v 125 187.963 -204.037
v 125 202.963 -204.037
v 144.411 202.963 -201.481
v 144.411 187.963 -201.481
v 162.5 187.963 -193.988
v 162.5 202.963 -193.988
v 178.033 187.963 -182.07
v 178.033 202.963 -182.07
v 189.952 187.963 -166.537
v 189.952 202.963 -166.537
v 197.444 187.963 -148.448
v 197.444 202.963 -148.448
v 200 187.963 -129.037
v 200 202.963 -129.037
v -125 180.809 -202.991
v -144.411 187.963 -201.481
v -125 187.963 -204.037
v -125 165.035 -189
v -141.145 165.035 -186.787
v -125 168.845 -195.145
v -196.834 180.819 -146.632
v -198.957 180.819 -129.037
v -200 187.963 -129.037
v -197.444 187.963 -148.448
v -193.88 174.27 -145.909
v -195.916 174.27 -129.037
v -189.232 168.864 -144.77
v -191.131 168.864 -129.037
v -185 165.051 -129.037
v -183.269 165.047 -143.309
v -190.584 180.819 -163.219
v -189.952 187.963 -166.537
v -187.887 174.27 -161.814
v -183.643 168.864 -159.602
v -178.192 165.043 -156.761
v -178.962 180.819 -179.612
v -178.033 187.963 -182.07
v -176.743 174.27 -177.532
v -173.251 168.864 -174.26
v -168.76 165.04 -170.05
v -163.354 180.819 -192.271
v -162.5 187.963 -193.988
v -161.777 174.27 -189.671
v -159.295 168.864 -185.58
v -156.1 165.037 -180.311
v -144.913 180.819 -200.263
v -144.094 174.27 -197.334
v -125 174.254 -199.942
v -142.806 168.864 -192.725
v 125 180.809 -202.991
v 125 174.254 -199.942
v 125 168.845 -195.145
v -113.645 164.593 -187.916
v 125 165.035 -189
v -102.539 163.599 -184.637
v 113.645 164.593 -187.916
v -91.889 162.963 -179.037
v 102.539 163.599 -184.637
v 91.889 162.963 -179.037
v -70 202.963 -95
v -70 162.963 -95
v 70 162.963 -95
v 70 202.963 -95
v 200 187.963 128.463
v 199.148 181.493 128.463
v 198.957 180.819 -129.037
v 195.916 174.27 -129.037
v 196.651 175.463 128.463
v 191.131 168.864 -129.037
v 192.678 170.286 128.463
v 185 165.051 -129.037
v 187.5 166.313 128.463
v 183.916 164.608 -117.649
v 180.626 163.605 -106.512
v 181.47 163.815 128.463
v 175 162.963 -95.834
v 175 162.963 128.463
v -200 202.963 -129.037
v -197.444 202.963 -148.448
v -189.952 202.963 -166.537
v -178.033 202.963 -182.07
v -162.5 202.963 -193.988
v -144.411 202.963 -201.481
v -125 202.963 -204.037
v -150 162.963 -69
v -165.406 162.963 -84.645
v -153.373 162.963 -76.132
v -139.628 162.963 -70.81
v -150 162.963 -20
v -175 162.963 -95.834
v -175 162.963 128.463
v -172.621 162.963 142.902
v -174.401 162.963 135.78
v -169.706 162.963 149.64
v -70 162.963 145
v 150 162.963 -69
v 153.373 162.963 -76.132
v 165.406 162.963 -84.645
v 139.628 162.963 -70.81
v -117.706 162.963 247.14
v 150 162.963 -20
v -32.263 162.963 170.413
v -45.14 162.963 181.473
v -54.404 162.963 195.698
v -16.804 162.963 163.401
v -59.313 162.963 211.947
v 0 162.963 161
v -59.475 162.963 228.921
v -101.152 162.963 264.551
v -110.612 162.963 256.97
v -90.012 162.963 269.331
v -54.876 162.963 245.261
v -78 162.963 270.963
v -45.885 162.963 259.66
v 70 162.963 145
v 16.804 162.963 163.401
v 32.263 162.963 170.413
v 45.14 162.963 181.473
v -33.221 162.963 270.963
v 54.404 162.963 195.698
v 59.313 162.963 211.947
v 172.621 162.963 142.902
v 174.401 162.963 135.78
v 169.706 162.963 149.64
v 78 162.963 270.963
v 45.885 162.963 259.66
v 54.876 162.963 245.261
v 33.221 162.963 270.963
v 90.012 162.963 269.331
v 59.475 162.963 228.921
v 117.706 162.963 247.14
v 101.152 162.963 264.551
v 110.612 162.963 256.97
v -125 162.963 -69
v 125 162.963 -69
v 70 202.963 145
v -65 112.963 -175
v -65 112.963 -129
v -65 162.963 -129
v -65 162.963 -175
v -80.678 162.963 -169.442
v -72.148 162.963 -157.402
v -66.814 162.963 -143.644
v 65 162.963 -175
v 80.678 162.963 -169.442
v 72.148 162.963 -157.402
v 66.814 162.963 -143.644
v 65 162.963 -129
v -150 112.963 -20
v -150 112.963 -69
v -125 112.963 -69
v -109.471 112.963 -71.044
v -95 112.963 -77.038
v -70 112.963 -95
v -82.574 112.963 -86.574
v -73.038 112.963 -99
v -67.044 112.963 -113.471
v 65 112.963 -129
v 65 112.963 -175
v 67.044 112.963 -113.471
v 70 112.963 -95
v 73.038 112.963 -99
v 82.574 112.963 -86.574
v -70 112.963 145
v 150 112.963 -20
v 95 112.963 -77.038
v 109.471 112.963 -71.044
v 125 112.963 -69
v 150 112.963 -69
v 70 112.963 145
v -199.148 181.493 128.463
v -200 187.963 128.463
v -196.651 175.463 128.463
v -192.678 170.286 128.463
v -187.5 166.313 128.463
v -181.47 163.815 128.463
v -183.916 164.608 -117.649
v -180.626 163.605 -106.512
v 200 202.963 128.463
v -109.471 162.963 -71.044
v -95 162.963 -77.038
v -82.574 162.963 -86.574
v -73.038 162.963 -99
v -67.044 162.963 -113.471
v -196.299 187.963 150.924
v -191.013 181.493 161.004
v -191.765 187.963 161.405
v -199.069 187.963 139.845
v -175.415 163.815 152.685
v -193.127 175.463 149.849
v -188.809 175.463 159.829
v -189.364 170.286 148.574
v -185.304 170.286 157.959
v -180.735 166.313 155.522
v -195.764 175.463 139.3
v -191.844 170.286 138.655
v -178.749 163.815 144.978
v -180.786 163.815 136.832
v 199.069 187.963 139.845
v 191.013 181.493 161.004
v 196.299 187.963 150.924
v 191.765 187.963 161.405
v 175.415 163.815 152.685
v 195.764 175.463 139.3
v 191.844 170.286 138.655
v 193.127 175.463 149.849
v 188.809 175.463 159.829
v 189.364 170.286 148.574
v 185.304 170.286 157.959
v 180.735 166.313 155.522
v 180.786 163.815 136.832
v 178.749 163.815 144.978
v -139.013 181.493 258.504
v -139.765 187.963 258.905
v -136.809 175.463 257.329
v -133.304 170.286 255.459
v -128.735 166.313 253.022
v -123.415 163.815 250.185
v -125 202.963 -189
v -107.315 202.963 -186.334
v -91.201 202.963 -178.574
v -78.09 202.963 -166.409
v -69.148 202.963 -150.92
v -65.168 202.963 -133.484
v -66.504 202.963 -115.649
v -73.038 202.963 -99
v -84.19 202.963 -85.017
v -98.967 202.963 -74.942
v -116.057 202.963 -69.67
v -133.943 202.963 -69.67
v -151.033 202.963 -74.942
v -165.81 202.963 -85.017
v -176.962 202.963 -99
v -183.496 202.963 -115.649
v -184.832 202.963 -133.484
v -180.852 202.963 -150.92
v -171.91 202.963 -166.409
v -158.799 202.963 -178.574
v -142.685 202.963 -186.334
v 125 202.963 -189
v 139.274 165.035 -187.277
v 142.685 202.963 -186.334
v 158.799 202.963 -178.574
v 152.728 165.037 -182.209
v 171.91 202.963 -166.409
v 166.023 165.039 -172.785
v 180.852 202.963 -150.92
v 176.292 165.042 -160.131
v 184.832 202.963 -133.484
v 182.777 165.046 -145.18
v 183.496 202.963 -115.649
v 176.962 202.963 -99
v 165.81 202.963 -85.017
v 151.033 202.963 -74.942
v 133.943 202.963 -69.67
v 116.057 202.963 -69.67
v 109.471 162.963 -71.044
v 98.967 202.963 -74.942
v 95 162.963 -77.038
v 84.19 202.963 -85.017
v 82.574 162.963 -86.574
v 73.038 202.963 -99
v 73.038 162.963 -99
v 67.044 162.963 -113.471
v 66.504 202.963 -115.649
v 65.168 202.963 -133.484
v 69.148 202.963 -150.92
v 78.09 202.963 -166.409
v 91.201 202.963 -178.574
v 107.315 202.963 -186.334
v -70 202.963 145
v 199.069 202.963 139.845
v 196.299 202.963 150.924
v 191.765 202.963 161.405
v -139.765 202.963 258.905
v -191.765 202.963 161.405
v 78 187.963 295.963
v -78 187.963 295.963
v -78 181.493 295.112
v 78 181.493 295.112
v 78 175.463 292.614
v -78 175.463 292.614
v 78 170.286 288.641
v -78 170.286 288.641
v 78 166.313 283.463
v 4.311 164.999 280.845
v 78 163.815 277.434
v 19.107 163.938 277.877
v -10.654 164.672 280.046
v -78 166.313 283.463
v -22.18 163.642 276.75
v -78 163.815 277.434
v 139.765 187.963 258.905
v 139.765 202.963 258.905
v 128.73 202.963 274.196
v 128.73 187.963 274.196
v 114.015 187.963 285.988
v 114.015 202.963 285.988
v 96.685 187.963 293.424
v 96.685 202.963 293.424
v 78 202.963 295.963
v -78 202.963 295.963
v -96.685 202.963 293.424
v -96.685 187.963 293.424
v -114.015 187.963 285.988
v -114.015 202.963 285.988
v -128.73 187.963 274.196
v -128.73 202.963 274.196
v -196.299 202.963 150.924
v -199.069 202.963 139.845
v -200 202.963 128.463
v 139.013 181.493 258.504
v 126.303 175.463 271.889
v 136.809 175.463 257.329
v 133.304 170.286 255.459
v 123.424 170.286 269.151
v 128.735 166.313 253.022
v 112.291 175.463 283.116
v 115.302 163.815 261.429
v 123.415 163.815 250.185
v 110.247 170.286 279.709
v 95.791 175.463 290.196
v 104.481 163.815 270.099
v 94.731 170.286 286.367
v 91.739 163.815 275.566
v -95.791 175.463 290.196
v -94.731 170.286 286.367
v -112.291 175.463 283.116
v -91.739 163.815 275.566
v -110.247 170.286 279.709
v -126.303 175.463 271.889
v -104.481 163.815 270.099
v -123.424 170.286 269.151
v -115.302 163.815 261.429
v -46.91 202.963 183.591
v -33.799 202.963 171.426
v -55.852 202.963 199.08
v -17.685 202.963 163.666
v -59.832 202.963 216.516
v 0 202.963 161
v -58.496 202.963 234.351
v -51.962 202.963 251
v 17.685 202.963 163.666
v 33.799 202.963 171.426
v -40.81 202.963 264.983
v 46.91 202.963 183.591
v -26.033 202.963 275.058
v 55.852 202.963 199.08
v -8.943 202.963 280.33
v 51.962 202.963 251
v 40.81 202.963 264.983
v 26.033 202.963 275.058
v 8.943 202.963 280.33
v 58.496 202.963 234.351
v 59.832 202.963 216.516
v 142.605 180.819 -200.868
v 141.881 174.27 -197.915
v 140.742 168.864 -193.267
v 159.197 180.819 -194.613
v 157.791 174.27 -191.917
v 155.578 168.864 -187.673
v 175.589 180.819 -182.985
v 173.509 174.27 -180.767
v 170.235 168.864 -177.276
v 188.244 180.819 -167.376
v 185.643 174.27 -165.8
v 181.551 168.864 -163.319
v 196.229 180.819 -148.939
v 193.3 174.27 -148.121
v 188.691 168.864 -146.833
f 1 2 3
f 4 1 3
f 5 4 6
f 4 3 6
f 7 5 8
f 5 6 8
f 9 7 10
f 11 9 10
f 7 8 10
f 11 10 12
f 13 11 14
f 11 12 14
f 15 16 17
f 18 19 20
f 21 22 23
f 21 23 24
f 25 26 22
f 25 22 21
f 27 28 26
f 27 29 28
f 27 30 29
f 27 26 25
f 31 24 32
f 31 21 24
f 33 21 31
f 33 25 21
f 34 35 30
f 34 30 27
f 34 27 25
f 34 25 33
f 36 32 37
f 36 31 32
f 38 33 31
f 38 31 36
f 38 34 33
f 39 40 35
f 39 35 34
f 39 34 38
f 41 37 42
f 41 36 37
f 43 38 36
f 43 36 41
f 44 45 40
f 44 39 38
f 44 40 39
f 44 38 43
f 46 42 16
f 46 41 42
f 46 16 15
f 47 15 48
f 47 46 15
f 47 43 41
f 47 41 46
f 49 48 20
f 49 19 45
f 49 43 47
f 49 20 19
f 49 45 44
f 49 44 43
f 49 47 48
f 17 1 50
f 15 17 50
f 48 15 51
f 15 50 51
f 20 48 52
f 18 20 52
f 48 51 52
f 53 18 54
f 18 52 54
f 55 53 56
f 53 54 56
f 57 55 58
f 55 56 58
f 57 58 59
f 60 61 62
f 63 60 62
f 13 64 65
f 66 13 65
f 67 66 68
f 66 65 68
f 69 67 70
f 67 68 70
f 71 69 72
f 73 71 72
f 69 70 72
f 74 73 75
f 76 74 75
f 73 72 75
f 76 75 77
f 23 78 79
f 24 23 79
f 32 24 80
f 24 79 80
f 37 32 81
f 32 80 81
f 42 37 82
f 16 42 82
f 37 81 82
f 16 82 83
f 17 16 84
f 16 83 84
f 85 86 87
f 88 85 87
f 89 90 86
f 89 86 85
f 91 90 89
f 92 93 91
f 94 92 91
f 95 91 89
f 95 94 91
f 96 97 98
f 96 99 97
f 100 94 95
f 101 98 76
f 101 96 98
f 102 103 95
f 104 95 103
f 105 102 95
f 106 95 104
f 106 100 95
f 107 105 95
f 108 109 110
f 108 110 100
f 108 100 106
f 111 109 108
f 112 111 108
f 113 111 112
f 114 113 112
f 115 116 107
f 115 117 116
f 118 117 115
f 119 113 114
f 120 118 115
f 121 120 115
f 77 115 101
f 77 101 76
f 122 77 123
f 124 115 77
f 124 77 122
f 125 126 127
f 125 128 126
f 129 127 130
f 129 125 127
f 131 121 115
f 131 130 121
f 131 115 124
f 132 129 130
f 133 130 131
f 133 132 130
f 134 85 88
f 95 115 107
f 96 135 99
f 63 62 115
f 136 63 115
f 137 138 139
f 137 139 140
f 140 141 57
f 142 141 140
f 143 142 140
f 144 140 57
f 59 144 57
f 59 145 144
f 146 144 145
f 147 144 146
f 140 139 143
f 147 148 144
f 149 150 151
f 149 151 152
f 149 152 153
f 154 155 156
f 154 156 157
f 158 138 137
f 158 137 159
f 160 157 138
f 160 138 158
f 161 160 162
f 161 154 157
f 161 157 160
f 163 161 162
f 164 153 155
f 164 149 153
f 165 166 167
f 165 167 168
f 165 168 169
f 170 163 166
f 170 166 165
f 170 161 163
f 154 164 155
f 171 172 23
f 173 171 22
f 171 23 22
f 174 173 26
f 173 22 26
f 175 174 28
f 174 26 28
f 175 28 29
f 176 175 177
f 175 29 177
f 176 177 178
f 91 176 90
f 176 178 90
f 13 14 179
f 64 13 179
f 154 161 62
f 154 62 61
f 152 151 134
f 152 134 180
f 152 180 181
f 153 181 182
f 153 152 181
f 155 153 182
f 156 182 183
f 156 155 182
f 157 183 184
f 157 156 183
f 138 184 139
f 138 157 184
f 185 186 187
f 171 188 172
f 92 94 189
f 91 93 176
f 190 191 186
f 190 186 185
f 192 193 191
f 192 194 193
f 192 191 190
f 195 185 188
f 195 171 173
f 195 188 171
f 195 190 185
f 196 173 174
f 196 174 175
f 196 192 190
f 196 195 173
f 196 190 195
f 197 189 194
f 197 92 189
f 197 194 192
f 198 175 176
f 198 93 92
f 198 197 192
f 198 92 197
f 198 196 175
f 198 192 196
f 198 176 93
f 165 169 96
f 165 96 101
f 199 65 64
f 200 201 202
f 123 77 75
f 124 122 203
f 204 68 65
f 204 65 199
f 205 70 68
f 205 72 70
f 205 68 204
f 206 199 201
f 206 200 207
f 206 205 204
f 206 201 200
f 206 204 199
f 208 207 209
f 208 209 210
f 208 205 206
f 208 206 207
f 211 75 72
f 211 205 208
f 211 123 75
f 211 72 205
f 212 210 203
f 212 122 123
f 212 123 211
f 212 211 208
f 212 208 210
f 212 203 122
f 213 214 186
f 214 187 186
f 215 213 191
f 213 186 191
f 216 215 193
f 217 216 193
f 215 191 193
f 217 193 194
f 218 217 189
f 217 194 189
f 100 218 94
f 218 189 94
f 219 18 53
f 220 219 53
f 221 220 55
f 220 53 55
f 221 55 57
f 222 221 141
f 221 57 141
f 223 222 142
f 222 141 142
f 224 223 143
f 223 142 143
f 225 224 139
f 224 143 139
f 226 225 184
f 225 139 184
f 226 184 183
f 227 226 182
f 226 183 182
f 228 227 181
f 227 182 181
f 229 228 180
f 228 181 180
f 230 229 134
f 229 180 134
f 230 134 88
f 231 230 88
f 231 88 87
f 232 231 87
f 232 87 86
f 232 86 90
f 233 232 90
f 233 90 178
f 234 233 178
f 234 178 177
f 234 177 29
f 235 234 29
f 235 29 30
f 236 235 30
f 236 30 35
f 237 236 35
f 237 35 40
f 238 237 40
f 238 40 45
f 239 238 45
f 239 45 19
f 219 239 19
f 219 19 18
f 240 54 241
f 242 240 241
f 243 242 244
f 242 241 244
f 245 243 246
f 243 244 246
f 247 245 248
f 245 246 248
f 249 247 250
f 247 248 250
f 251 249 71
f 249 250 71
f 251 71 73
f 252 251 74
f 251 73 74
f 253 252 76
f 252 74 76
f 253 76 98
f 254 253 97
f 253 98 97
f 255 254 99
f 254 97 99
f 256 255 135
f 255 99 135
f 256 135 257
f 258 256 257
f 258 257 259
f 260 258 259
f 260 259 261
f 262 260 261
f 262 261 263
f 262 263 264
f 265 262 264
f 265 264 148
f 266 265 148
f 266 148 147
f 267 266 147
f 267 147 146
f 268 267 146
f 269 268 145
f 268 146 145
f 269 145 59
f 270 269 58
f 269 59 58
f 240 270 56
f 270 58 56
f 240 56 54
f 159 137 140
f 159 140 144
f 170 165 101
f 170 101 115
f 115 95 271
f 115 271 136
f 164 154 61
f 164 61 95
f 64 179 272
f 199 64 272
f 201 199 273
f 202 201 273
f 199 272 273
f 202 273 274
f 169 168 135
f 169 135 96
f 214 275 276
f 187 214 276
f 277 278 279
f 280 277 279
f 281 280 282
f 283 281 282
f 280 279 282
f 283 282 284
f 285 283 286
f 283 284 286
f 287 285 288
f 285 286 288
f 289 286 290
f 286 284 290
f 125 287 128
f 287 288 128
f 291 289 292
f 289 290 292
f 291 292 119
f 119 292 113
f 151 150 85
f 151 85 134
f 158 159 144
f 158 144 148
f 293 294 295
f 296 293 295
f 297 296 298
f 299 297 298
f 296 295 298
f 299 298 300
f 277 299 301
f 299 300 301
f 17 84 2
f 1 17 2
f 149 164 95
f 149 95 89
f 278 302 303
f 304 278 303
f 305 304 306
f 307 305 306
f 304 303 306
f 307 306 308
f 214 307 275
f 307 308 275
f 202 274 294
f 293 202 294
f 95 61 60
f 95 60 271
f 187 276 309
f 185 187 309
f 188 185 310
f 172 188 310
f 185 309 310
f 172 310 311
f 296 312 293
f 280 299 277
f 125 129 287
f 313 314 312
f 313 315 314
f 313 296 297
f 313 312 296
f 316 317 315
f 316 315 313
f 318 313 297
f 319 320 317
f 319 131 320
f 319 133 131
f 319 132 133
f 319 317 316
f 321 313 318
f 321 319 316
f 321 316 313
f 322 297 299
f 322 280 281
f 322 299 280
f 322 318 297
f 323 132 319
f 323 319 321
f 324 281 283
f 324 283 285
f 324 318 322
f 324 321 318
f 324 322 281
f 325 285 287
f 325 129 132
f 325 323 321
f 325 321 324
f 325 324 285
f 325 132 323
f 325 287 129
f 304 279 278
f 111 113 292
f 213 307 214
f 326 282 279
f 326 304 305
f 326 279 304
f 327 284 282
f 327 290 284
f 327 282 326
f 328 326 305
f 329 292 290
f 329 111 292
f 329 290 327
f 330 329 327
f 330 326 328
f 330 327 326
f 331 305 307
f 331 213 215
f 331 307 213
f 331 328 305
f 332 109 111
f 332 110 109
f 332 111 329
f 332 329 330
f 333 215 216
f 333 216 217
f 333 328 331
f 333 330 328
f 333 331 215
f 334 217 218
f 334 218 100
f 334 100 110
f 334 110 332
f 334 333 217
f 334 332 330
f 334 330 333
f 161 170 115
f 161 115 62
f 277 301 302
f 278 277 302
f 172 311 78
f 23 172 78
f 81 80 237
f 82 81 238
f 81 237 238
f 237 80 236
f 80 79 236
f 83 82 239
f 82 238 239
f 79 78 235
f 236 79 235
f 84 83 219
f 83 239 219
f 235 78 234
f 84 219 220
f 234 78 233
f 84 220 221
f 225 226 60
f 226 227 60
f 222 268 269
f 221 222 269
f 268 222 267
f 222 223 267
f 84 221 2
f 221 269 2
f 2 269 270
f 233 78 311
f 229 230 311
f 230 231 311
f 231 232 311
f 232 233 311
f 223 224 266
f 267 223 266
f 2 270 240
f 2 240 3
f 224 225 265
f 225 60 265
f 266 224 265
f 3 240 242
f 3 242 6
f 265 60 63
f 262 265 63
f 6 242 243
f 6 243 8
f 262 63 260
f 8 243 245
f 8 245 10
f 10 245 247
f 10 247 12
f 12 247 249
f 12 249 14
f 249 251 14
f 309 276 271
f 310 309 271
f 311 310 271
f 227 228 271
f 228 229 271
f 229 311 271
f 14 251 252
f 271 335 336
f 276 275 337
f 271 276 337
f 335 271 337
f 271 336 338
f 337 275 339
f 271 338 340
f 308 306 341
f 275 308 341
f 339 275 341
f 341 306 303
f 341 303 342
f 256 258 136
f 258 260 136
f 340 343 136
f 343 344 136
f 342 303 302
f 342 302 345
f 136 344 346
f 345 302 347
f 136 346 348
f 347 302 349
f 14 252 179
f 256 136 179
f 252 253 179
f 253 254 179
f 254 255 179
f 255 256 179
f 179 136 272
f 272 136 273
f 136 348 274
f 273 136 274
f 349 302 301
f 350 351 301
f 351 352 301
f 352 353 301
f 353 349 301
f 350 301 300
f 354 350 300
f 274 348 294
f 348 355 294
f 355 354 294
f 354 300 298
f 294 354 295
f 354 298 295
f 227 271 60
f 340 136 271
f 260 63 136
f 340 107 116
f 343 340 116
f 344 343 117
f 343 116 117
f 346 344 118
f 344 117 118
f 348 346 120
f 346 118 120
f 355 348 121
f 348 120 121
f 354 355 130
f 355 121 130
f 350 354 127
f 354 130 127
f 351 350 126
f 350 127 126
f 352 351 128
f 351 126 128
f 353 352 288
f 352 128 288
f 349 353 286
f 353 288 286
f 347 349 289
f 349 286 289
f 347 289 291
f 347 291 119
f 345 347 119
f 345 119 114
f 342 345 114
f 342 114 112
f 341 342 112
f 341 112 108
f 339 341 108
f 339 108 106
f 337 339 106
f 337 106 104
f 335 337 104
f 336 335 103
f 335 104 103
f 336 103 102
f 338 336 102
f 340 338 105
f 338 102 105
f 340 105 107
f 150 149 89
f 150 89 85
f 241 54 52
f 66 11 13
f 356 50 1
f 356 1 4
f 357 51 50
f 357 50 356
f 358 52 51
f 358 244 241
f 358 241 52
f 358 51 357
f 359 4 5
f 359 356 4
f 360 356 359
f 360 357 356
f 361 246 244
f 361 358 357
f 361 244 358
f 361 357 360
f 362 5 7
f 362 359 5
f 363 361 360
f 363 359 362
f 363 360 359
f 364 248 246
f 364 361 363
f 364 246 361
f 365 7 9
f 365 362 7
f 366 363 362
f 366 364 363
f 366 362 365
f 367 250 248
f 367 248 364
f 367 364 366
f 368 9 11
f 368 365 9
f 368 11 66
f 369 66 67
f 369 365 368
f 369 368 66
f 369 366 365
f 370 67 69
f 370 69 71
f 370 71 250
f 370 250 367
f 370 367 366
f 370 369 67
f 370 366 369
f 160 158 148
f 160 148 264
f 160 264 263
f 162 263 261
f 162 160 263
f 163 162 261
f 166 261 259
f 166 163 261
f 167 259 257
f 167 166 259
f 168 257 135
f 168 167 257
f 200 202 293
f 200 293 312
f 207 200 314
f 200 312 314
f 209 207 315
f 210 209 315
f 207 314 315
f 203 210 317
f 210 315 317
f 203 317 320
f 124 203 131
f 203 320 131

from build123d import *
from build123d.topology import SkipClean

# Parameters (mm, degrees)
BOSS_EXTRUDE1_DEPTH = 40
FILLET1_R           = 25
SKETCH3_R           = 60
SKETCH3_W           = 140
SKETCH3_H           = 240
CUT_EXTRUDE1_DEPTH  = 360.436212163
BOSS_EXTRUDE2_START = 50
BOSS_EXTRUDE2_DEPTH = 50


with BuildPart() as part:
    # Sketch2 → Boss-Extrude1 (new body)
    with BuildSketch(Plane.XZ.offset(-202.963495408)):
        with BuildLine():
            Line((-139.764705882, 258.904671879), (-191.764705882, 161.404671879))
            ThreePointArc((-191.764705882, 161.404671879), (-197.90997501, 145.440989161), (-200, 128.463495408))
            Line((-200, 128.463495408), (-200, -129.036504592))
            ThreePointArc((-200, -129.036504592), (-178.033008589, -182.06951318), (-125, -204.036504592))
            Line((-125, -204.036504592), (125, -204.036504592))
            ThreePointArc((125, -204.036504592), (178.033008589, -182.06951318), (200, -129.036504592))
            Line((200, -129.036504592), (200, 128.463495408))
            ThreePointArc((200, 128.463495408), (197.90997501, 145.440989161), (191.764705882, 161.404671879))
            Line((191.764705882, 161.404671879), (139.764705882, 258.904671879))
            ThreePointArc((139.764705882, 258.904671879), (114.01470288, 285.988000208), (78, 295.963495408))
            Line((78, 295.963495408), (-78, 295.963495408))
            ThreePointArc((-78, 295.963495408), (-114.01470288, 285.988000208), (-139.764705882, 258.904671879))
        make_face()
    extrude(amount=BOSS_EXTRUDE1_DEPTH)

    # Fillet1
    fillet1_edges = [part.edges().sort_by_distance(p)[0] for p in [
        (-197.90997501, 162.963495408, 145.440989161),
        (-200, 162.963495408, -0.286504592),
        (-178.033008589, 162.963495408, -182.06951318),
        (0, 162.963495408, -204.036504592),
        (178.033008589, 162.963495408, -182.06951318),
        (200, 162.963495408, -0.286504592),
        (197.90997501, 162.963495408, 145.440989161),
        (165.764705882, 162.963495408, 210.154671879),
        (114.01470288, 162.963495408, 285.988000208),
        (0, 162.963495408, 295.963495408),
        (-114.01470288, 162.963495408, 285.988000208),
        (-165.764705882, 162.963495408, 210.154671879),
    ]]
    fillet(fillet1_edges, radius=FILLET1_R)

    # Sketch3 → Cut-Extrude1 (cut, through all)
    with BuildSketch(Plane.XZ.offset(-162.963495408)):
        with Locations(Location((0, 221, 0), (0, 0, 270))):
            Circle(SKETCH3_R)
        with Locations(Location((125, -129, 0), (0, 0, 270))):
            Circle(SKETCH3_R)
        with Locations(Location((-125, -129, 0), (0, 0, 270))):
            Circle(SKETCH3_R)
        with Locations((0, 25)):
            Rectangle(SKETCH3_W, SKETCH3_H)
    extrude(amount=-CUT_EXTRUDE1_DEPTH, mode=Mode.SUBTRACT)

    # Sketch4 → Boss-Extrude2 (add)
    with SkipClean():  # the faces are left unmerged after this step: merging them gives an invalid solid
        with BuildSketch(Plane.XZ.offset(-162.963495408).offset(BOSS_EXTRUDE2_START)):
            with BuildLine():
                Line((-70, 145), (-150, -20))
                Line((-150, -20), (-150, -69))
                Line((-150, -69), (-125, -69))
                ThreePointArc((-125, -69), (-82.573593129, -86.573593129), (-65, -129))
                Line((-65, -129), (-65, -175))
                Line((-65, -175), (65, -175))
                Line((65, -175), (65, -129))
                ThreePointArc((65, -129), (82.573593129, -86.573593129), (125, -69))
                Line((125, -69), (150, -69))
                Line((150, -69), (150, -20))
                Line((150, -20), (70, 145))
                Line((70, 145), (70, -95))
                Line((70, -95), (-70, -95))
                Line((-70, -95), (-70, 145))
            make_face()
        extrude(amount=-BOSS_EXTRUDE2_DEPTH)


solid = part.part
